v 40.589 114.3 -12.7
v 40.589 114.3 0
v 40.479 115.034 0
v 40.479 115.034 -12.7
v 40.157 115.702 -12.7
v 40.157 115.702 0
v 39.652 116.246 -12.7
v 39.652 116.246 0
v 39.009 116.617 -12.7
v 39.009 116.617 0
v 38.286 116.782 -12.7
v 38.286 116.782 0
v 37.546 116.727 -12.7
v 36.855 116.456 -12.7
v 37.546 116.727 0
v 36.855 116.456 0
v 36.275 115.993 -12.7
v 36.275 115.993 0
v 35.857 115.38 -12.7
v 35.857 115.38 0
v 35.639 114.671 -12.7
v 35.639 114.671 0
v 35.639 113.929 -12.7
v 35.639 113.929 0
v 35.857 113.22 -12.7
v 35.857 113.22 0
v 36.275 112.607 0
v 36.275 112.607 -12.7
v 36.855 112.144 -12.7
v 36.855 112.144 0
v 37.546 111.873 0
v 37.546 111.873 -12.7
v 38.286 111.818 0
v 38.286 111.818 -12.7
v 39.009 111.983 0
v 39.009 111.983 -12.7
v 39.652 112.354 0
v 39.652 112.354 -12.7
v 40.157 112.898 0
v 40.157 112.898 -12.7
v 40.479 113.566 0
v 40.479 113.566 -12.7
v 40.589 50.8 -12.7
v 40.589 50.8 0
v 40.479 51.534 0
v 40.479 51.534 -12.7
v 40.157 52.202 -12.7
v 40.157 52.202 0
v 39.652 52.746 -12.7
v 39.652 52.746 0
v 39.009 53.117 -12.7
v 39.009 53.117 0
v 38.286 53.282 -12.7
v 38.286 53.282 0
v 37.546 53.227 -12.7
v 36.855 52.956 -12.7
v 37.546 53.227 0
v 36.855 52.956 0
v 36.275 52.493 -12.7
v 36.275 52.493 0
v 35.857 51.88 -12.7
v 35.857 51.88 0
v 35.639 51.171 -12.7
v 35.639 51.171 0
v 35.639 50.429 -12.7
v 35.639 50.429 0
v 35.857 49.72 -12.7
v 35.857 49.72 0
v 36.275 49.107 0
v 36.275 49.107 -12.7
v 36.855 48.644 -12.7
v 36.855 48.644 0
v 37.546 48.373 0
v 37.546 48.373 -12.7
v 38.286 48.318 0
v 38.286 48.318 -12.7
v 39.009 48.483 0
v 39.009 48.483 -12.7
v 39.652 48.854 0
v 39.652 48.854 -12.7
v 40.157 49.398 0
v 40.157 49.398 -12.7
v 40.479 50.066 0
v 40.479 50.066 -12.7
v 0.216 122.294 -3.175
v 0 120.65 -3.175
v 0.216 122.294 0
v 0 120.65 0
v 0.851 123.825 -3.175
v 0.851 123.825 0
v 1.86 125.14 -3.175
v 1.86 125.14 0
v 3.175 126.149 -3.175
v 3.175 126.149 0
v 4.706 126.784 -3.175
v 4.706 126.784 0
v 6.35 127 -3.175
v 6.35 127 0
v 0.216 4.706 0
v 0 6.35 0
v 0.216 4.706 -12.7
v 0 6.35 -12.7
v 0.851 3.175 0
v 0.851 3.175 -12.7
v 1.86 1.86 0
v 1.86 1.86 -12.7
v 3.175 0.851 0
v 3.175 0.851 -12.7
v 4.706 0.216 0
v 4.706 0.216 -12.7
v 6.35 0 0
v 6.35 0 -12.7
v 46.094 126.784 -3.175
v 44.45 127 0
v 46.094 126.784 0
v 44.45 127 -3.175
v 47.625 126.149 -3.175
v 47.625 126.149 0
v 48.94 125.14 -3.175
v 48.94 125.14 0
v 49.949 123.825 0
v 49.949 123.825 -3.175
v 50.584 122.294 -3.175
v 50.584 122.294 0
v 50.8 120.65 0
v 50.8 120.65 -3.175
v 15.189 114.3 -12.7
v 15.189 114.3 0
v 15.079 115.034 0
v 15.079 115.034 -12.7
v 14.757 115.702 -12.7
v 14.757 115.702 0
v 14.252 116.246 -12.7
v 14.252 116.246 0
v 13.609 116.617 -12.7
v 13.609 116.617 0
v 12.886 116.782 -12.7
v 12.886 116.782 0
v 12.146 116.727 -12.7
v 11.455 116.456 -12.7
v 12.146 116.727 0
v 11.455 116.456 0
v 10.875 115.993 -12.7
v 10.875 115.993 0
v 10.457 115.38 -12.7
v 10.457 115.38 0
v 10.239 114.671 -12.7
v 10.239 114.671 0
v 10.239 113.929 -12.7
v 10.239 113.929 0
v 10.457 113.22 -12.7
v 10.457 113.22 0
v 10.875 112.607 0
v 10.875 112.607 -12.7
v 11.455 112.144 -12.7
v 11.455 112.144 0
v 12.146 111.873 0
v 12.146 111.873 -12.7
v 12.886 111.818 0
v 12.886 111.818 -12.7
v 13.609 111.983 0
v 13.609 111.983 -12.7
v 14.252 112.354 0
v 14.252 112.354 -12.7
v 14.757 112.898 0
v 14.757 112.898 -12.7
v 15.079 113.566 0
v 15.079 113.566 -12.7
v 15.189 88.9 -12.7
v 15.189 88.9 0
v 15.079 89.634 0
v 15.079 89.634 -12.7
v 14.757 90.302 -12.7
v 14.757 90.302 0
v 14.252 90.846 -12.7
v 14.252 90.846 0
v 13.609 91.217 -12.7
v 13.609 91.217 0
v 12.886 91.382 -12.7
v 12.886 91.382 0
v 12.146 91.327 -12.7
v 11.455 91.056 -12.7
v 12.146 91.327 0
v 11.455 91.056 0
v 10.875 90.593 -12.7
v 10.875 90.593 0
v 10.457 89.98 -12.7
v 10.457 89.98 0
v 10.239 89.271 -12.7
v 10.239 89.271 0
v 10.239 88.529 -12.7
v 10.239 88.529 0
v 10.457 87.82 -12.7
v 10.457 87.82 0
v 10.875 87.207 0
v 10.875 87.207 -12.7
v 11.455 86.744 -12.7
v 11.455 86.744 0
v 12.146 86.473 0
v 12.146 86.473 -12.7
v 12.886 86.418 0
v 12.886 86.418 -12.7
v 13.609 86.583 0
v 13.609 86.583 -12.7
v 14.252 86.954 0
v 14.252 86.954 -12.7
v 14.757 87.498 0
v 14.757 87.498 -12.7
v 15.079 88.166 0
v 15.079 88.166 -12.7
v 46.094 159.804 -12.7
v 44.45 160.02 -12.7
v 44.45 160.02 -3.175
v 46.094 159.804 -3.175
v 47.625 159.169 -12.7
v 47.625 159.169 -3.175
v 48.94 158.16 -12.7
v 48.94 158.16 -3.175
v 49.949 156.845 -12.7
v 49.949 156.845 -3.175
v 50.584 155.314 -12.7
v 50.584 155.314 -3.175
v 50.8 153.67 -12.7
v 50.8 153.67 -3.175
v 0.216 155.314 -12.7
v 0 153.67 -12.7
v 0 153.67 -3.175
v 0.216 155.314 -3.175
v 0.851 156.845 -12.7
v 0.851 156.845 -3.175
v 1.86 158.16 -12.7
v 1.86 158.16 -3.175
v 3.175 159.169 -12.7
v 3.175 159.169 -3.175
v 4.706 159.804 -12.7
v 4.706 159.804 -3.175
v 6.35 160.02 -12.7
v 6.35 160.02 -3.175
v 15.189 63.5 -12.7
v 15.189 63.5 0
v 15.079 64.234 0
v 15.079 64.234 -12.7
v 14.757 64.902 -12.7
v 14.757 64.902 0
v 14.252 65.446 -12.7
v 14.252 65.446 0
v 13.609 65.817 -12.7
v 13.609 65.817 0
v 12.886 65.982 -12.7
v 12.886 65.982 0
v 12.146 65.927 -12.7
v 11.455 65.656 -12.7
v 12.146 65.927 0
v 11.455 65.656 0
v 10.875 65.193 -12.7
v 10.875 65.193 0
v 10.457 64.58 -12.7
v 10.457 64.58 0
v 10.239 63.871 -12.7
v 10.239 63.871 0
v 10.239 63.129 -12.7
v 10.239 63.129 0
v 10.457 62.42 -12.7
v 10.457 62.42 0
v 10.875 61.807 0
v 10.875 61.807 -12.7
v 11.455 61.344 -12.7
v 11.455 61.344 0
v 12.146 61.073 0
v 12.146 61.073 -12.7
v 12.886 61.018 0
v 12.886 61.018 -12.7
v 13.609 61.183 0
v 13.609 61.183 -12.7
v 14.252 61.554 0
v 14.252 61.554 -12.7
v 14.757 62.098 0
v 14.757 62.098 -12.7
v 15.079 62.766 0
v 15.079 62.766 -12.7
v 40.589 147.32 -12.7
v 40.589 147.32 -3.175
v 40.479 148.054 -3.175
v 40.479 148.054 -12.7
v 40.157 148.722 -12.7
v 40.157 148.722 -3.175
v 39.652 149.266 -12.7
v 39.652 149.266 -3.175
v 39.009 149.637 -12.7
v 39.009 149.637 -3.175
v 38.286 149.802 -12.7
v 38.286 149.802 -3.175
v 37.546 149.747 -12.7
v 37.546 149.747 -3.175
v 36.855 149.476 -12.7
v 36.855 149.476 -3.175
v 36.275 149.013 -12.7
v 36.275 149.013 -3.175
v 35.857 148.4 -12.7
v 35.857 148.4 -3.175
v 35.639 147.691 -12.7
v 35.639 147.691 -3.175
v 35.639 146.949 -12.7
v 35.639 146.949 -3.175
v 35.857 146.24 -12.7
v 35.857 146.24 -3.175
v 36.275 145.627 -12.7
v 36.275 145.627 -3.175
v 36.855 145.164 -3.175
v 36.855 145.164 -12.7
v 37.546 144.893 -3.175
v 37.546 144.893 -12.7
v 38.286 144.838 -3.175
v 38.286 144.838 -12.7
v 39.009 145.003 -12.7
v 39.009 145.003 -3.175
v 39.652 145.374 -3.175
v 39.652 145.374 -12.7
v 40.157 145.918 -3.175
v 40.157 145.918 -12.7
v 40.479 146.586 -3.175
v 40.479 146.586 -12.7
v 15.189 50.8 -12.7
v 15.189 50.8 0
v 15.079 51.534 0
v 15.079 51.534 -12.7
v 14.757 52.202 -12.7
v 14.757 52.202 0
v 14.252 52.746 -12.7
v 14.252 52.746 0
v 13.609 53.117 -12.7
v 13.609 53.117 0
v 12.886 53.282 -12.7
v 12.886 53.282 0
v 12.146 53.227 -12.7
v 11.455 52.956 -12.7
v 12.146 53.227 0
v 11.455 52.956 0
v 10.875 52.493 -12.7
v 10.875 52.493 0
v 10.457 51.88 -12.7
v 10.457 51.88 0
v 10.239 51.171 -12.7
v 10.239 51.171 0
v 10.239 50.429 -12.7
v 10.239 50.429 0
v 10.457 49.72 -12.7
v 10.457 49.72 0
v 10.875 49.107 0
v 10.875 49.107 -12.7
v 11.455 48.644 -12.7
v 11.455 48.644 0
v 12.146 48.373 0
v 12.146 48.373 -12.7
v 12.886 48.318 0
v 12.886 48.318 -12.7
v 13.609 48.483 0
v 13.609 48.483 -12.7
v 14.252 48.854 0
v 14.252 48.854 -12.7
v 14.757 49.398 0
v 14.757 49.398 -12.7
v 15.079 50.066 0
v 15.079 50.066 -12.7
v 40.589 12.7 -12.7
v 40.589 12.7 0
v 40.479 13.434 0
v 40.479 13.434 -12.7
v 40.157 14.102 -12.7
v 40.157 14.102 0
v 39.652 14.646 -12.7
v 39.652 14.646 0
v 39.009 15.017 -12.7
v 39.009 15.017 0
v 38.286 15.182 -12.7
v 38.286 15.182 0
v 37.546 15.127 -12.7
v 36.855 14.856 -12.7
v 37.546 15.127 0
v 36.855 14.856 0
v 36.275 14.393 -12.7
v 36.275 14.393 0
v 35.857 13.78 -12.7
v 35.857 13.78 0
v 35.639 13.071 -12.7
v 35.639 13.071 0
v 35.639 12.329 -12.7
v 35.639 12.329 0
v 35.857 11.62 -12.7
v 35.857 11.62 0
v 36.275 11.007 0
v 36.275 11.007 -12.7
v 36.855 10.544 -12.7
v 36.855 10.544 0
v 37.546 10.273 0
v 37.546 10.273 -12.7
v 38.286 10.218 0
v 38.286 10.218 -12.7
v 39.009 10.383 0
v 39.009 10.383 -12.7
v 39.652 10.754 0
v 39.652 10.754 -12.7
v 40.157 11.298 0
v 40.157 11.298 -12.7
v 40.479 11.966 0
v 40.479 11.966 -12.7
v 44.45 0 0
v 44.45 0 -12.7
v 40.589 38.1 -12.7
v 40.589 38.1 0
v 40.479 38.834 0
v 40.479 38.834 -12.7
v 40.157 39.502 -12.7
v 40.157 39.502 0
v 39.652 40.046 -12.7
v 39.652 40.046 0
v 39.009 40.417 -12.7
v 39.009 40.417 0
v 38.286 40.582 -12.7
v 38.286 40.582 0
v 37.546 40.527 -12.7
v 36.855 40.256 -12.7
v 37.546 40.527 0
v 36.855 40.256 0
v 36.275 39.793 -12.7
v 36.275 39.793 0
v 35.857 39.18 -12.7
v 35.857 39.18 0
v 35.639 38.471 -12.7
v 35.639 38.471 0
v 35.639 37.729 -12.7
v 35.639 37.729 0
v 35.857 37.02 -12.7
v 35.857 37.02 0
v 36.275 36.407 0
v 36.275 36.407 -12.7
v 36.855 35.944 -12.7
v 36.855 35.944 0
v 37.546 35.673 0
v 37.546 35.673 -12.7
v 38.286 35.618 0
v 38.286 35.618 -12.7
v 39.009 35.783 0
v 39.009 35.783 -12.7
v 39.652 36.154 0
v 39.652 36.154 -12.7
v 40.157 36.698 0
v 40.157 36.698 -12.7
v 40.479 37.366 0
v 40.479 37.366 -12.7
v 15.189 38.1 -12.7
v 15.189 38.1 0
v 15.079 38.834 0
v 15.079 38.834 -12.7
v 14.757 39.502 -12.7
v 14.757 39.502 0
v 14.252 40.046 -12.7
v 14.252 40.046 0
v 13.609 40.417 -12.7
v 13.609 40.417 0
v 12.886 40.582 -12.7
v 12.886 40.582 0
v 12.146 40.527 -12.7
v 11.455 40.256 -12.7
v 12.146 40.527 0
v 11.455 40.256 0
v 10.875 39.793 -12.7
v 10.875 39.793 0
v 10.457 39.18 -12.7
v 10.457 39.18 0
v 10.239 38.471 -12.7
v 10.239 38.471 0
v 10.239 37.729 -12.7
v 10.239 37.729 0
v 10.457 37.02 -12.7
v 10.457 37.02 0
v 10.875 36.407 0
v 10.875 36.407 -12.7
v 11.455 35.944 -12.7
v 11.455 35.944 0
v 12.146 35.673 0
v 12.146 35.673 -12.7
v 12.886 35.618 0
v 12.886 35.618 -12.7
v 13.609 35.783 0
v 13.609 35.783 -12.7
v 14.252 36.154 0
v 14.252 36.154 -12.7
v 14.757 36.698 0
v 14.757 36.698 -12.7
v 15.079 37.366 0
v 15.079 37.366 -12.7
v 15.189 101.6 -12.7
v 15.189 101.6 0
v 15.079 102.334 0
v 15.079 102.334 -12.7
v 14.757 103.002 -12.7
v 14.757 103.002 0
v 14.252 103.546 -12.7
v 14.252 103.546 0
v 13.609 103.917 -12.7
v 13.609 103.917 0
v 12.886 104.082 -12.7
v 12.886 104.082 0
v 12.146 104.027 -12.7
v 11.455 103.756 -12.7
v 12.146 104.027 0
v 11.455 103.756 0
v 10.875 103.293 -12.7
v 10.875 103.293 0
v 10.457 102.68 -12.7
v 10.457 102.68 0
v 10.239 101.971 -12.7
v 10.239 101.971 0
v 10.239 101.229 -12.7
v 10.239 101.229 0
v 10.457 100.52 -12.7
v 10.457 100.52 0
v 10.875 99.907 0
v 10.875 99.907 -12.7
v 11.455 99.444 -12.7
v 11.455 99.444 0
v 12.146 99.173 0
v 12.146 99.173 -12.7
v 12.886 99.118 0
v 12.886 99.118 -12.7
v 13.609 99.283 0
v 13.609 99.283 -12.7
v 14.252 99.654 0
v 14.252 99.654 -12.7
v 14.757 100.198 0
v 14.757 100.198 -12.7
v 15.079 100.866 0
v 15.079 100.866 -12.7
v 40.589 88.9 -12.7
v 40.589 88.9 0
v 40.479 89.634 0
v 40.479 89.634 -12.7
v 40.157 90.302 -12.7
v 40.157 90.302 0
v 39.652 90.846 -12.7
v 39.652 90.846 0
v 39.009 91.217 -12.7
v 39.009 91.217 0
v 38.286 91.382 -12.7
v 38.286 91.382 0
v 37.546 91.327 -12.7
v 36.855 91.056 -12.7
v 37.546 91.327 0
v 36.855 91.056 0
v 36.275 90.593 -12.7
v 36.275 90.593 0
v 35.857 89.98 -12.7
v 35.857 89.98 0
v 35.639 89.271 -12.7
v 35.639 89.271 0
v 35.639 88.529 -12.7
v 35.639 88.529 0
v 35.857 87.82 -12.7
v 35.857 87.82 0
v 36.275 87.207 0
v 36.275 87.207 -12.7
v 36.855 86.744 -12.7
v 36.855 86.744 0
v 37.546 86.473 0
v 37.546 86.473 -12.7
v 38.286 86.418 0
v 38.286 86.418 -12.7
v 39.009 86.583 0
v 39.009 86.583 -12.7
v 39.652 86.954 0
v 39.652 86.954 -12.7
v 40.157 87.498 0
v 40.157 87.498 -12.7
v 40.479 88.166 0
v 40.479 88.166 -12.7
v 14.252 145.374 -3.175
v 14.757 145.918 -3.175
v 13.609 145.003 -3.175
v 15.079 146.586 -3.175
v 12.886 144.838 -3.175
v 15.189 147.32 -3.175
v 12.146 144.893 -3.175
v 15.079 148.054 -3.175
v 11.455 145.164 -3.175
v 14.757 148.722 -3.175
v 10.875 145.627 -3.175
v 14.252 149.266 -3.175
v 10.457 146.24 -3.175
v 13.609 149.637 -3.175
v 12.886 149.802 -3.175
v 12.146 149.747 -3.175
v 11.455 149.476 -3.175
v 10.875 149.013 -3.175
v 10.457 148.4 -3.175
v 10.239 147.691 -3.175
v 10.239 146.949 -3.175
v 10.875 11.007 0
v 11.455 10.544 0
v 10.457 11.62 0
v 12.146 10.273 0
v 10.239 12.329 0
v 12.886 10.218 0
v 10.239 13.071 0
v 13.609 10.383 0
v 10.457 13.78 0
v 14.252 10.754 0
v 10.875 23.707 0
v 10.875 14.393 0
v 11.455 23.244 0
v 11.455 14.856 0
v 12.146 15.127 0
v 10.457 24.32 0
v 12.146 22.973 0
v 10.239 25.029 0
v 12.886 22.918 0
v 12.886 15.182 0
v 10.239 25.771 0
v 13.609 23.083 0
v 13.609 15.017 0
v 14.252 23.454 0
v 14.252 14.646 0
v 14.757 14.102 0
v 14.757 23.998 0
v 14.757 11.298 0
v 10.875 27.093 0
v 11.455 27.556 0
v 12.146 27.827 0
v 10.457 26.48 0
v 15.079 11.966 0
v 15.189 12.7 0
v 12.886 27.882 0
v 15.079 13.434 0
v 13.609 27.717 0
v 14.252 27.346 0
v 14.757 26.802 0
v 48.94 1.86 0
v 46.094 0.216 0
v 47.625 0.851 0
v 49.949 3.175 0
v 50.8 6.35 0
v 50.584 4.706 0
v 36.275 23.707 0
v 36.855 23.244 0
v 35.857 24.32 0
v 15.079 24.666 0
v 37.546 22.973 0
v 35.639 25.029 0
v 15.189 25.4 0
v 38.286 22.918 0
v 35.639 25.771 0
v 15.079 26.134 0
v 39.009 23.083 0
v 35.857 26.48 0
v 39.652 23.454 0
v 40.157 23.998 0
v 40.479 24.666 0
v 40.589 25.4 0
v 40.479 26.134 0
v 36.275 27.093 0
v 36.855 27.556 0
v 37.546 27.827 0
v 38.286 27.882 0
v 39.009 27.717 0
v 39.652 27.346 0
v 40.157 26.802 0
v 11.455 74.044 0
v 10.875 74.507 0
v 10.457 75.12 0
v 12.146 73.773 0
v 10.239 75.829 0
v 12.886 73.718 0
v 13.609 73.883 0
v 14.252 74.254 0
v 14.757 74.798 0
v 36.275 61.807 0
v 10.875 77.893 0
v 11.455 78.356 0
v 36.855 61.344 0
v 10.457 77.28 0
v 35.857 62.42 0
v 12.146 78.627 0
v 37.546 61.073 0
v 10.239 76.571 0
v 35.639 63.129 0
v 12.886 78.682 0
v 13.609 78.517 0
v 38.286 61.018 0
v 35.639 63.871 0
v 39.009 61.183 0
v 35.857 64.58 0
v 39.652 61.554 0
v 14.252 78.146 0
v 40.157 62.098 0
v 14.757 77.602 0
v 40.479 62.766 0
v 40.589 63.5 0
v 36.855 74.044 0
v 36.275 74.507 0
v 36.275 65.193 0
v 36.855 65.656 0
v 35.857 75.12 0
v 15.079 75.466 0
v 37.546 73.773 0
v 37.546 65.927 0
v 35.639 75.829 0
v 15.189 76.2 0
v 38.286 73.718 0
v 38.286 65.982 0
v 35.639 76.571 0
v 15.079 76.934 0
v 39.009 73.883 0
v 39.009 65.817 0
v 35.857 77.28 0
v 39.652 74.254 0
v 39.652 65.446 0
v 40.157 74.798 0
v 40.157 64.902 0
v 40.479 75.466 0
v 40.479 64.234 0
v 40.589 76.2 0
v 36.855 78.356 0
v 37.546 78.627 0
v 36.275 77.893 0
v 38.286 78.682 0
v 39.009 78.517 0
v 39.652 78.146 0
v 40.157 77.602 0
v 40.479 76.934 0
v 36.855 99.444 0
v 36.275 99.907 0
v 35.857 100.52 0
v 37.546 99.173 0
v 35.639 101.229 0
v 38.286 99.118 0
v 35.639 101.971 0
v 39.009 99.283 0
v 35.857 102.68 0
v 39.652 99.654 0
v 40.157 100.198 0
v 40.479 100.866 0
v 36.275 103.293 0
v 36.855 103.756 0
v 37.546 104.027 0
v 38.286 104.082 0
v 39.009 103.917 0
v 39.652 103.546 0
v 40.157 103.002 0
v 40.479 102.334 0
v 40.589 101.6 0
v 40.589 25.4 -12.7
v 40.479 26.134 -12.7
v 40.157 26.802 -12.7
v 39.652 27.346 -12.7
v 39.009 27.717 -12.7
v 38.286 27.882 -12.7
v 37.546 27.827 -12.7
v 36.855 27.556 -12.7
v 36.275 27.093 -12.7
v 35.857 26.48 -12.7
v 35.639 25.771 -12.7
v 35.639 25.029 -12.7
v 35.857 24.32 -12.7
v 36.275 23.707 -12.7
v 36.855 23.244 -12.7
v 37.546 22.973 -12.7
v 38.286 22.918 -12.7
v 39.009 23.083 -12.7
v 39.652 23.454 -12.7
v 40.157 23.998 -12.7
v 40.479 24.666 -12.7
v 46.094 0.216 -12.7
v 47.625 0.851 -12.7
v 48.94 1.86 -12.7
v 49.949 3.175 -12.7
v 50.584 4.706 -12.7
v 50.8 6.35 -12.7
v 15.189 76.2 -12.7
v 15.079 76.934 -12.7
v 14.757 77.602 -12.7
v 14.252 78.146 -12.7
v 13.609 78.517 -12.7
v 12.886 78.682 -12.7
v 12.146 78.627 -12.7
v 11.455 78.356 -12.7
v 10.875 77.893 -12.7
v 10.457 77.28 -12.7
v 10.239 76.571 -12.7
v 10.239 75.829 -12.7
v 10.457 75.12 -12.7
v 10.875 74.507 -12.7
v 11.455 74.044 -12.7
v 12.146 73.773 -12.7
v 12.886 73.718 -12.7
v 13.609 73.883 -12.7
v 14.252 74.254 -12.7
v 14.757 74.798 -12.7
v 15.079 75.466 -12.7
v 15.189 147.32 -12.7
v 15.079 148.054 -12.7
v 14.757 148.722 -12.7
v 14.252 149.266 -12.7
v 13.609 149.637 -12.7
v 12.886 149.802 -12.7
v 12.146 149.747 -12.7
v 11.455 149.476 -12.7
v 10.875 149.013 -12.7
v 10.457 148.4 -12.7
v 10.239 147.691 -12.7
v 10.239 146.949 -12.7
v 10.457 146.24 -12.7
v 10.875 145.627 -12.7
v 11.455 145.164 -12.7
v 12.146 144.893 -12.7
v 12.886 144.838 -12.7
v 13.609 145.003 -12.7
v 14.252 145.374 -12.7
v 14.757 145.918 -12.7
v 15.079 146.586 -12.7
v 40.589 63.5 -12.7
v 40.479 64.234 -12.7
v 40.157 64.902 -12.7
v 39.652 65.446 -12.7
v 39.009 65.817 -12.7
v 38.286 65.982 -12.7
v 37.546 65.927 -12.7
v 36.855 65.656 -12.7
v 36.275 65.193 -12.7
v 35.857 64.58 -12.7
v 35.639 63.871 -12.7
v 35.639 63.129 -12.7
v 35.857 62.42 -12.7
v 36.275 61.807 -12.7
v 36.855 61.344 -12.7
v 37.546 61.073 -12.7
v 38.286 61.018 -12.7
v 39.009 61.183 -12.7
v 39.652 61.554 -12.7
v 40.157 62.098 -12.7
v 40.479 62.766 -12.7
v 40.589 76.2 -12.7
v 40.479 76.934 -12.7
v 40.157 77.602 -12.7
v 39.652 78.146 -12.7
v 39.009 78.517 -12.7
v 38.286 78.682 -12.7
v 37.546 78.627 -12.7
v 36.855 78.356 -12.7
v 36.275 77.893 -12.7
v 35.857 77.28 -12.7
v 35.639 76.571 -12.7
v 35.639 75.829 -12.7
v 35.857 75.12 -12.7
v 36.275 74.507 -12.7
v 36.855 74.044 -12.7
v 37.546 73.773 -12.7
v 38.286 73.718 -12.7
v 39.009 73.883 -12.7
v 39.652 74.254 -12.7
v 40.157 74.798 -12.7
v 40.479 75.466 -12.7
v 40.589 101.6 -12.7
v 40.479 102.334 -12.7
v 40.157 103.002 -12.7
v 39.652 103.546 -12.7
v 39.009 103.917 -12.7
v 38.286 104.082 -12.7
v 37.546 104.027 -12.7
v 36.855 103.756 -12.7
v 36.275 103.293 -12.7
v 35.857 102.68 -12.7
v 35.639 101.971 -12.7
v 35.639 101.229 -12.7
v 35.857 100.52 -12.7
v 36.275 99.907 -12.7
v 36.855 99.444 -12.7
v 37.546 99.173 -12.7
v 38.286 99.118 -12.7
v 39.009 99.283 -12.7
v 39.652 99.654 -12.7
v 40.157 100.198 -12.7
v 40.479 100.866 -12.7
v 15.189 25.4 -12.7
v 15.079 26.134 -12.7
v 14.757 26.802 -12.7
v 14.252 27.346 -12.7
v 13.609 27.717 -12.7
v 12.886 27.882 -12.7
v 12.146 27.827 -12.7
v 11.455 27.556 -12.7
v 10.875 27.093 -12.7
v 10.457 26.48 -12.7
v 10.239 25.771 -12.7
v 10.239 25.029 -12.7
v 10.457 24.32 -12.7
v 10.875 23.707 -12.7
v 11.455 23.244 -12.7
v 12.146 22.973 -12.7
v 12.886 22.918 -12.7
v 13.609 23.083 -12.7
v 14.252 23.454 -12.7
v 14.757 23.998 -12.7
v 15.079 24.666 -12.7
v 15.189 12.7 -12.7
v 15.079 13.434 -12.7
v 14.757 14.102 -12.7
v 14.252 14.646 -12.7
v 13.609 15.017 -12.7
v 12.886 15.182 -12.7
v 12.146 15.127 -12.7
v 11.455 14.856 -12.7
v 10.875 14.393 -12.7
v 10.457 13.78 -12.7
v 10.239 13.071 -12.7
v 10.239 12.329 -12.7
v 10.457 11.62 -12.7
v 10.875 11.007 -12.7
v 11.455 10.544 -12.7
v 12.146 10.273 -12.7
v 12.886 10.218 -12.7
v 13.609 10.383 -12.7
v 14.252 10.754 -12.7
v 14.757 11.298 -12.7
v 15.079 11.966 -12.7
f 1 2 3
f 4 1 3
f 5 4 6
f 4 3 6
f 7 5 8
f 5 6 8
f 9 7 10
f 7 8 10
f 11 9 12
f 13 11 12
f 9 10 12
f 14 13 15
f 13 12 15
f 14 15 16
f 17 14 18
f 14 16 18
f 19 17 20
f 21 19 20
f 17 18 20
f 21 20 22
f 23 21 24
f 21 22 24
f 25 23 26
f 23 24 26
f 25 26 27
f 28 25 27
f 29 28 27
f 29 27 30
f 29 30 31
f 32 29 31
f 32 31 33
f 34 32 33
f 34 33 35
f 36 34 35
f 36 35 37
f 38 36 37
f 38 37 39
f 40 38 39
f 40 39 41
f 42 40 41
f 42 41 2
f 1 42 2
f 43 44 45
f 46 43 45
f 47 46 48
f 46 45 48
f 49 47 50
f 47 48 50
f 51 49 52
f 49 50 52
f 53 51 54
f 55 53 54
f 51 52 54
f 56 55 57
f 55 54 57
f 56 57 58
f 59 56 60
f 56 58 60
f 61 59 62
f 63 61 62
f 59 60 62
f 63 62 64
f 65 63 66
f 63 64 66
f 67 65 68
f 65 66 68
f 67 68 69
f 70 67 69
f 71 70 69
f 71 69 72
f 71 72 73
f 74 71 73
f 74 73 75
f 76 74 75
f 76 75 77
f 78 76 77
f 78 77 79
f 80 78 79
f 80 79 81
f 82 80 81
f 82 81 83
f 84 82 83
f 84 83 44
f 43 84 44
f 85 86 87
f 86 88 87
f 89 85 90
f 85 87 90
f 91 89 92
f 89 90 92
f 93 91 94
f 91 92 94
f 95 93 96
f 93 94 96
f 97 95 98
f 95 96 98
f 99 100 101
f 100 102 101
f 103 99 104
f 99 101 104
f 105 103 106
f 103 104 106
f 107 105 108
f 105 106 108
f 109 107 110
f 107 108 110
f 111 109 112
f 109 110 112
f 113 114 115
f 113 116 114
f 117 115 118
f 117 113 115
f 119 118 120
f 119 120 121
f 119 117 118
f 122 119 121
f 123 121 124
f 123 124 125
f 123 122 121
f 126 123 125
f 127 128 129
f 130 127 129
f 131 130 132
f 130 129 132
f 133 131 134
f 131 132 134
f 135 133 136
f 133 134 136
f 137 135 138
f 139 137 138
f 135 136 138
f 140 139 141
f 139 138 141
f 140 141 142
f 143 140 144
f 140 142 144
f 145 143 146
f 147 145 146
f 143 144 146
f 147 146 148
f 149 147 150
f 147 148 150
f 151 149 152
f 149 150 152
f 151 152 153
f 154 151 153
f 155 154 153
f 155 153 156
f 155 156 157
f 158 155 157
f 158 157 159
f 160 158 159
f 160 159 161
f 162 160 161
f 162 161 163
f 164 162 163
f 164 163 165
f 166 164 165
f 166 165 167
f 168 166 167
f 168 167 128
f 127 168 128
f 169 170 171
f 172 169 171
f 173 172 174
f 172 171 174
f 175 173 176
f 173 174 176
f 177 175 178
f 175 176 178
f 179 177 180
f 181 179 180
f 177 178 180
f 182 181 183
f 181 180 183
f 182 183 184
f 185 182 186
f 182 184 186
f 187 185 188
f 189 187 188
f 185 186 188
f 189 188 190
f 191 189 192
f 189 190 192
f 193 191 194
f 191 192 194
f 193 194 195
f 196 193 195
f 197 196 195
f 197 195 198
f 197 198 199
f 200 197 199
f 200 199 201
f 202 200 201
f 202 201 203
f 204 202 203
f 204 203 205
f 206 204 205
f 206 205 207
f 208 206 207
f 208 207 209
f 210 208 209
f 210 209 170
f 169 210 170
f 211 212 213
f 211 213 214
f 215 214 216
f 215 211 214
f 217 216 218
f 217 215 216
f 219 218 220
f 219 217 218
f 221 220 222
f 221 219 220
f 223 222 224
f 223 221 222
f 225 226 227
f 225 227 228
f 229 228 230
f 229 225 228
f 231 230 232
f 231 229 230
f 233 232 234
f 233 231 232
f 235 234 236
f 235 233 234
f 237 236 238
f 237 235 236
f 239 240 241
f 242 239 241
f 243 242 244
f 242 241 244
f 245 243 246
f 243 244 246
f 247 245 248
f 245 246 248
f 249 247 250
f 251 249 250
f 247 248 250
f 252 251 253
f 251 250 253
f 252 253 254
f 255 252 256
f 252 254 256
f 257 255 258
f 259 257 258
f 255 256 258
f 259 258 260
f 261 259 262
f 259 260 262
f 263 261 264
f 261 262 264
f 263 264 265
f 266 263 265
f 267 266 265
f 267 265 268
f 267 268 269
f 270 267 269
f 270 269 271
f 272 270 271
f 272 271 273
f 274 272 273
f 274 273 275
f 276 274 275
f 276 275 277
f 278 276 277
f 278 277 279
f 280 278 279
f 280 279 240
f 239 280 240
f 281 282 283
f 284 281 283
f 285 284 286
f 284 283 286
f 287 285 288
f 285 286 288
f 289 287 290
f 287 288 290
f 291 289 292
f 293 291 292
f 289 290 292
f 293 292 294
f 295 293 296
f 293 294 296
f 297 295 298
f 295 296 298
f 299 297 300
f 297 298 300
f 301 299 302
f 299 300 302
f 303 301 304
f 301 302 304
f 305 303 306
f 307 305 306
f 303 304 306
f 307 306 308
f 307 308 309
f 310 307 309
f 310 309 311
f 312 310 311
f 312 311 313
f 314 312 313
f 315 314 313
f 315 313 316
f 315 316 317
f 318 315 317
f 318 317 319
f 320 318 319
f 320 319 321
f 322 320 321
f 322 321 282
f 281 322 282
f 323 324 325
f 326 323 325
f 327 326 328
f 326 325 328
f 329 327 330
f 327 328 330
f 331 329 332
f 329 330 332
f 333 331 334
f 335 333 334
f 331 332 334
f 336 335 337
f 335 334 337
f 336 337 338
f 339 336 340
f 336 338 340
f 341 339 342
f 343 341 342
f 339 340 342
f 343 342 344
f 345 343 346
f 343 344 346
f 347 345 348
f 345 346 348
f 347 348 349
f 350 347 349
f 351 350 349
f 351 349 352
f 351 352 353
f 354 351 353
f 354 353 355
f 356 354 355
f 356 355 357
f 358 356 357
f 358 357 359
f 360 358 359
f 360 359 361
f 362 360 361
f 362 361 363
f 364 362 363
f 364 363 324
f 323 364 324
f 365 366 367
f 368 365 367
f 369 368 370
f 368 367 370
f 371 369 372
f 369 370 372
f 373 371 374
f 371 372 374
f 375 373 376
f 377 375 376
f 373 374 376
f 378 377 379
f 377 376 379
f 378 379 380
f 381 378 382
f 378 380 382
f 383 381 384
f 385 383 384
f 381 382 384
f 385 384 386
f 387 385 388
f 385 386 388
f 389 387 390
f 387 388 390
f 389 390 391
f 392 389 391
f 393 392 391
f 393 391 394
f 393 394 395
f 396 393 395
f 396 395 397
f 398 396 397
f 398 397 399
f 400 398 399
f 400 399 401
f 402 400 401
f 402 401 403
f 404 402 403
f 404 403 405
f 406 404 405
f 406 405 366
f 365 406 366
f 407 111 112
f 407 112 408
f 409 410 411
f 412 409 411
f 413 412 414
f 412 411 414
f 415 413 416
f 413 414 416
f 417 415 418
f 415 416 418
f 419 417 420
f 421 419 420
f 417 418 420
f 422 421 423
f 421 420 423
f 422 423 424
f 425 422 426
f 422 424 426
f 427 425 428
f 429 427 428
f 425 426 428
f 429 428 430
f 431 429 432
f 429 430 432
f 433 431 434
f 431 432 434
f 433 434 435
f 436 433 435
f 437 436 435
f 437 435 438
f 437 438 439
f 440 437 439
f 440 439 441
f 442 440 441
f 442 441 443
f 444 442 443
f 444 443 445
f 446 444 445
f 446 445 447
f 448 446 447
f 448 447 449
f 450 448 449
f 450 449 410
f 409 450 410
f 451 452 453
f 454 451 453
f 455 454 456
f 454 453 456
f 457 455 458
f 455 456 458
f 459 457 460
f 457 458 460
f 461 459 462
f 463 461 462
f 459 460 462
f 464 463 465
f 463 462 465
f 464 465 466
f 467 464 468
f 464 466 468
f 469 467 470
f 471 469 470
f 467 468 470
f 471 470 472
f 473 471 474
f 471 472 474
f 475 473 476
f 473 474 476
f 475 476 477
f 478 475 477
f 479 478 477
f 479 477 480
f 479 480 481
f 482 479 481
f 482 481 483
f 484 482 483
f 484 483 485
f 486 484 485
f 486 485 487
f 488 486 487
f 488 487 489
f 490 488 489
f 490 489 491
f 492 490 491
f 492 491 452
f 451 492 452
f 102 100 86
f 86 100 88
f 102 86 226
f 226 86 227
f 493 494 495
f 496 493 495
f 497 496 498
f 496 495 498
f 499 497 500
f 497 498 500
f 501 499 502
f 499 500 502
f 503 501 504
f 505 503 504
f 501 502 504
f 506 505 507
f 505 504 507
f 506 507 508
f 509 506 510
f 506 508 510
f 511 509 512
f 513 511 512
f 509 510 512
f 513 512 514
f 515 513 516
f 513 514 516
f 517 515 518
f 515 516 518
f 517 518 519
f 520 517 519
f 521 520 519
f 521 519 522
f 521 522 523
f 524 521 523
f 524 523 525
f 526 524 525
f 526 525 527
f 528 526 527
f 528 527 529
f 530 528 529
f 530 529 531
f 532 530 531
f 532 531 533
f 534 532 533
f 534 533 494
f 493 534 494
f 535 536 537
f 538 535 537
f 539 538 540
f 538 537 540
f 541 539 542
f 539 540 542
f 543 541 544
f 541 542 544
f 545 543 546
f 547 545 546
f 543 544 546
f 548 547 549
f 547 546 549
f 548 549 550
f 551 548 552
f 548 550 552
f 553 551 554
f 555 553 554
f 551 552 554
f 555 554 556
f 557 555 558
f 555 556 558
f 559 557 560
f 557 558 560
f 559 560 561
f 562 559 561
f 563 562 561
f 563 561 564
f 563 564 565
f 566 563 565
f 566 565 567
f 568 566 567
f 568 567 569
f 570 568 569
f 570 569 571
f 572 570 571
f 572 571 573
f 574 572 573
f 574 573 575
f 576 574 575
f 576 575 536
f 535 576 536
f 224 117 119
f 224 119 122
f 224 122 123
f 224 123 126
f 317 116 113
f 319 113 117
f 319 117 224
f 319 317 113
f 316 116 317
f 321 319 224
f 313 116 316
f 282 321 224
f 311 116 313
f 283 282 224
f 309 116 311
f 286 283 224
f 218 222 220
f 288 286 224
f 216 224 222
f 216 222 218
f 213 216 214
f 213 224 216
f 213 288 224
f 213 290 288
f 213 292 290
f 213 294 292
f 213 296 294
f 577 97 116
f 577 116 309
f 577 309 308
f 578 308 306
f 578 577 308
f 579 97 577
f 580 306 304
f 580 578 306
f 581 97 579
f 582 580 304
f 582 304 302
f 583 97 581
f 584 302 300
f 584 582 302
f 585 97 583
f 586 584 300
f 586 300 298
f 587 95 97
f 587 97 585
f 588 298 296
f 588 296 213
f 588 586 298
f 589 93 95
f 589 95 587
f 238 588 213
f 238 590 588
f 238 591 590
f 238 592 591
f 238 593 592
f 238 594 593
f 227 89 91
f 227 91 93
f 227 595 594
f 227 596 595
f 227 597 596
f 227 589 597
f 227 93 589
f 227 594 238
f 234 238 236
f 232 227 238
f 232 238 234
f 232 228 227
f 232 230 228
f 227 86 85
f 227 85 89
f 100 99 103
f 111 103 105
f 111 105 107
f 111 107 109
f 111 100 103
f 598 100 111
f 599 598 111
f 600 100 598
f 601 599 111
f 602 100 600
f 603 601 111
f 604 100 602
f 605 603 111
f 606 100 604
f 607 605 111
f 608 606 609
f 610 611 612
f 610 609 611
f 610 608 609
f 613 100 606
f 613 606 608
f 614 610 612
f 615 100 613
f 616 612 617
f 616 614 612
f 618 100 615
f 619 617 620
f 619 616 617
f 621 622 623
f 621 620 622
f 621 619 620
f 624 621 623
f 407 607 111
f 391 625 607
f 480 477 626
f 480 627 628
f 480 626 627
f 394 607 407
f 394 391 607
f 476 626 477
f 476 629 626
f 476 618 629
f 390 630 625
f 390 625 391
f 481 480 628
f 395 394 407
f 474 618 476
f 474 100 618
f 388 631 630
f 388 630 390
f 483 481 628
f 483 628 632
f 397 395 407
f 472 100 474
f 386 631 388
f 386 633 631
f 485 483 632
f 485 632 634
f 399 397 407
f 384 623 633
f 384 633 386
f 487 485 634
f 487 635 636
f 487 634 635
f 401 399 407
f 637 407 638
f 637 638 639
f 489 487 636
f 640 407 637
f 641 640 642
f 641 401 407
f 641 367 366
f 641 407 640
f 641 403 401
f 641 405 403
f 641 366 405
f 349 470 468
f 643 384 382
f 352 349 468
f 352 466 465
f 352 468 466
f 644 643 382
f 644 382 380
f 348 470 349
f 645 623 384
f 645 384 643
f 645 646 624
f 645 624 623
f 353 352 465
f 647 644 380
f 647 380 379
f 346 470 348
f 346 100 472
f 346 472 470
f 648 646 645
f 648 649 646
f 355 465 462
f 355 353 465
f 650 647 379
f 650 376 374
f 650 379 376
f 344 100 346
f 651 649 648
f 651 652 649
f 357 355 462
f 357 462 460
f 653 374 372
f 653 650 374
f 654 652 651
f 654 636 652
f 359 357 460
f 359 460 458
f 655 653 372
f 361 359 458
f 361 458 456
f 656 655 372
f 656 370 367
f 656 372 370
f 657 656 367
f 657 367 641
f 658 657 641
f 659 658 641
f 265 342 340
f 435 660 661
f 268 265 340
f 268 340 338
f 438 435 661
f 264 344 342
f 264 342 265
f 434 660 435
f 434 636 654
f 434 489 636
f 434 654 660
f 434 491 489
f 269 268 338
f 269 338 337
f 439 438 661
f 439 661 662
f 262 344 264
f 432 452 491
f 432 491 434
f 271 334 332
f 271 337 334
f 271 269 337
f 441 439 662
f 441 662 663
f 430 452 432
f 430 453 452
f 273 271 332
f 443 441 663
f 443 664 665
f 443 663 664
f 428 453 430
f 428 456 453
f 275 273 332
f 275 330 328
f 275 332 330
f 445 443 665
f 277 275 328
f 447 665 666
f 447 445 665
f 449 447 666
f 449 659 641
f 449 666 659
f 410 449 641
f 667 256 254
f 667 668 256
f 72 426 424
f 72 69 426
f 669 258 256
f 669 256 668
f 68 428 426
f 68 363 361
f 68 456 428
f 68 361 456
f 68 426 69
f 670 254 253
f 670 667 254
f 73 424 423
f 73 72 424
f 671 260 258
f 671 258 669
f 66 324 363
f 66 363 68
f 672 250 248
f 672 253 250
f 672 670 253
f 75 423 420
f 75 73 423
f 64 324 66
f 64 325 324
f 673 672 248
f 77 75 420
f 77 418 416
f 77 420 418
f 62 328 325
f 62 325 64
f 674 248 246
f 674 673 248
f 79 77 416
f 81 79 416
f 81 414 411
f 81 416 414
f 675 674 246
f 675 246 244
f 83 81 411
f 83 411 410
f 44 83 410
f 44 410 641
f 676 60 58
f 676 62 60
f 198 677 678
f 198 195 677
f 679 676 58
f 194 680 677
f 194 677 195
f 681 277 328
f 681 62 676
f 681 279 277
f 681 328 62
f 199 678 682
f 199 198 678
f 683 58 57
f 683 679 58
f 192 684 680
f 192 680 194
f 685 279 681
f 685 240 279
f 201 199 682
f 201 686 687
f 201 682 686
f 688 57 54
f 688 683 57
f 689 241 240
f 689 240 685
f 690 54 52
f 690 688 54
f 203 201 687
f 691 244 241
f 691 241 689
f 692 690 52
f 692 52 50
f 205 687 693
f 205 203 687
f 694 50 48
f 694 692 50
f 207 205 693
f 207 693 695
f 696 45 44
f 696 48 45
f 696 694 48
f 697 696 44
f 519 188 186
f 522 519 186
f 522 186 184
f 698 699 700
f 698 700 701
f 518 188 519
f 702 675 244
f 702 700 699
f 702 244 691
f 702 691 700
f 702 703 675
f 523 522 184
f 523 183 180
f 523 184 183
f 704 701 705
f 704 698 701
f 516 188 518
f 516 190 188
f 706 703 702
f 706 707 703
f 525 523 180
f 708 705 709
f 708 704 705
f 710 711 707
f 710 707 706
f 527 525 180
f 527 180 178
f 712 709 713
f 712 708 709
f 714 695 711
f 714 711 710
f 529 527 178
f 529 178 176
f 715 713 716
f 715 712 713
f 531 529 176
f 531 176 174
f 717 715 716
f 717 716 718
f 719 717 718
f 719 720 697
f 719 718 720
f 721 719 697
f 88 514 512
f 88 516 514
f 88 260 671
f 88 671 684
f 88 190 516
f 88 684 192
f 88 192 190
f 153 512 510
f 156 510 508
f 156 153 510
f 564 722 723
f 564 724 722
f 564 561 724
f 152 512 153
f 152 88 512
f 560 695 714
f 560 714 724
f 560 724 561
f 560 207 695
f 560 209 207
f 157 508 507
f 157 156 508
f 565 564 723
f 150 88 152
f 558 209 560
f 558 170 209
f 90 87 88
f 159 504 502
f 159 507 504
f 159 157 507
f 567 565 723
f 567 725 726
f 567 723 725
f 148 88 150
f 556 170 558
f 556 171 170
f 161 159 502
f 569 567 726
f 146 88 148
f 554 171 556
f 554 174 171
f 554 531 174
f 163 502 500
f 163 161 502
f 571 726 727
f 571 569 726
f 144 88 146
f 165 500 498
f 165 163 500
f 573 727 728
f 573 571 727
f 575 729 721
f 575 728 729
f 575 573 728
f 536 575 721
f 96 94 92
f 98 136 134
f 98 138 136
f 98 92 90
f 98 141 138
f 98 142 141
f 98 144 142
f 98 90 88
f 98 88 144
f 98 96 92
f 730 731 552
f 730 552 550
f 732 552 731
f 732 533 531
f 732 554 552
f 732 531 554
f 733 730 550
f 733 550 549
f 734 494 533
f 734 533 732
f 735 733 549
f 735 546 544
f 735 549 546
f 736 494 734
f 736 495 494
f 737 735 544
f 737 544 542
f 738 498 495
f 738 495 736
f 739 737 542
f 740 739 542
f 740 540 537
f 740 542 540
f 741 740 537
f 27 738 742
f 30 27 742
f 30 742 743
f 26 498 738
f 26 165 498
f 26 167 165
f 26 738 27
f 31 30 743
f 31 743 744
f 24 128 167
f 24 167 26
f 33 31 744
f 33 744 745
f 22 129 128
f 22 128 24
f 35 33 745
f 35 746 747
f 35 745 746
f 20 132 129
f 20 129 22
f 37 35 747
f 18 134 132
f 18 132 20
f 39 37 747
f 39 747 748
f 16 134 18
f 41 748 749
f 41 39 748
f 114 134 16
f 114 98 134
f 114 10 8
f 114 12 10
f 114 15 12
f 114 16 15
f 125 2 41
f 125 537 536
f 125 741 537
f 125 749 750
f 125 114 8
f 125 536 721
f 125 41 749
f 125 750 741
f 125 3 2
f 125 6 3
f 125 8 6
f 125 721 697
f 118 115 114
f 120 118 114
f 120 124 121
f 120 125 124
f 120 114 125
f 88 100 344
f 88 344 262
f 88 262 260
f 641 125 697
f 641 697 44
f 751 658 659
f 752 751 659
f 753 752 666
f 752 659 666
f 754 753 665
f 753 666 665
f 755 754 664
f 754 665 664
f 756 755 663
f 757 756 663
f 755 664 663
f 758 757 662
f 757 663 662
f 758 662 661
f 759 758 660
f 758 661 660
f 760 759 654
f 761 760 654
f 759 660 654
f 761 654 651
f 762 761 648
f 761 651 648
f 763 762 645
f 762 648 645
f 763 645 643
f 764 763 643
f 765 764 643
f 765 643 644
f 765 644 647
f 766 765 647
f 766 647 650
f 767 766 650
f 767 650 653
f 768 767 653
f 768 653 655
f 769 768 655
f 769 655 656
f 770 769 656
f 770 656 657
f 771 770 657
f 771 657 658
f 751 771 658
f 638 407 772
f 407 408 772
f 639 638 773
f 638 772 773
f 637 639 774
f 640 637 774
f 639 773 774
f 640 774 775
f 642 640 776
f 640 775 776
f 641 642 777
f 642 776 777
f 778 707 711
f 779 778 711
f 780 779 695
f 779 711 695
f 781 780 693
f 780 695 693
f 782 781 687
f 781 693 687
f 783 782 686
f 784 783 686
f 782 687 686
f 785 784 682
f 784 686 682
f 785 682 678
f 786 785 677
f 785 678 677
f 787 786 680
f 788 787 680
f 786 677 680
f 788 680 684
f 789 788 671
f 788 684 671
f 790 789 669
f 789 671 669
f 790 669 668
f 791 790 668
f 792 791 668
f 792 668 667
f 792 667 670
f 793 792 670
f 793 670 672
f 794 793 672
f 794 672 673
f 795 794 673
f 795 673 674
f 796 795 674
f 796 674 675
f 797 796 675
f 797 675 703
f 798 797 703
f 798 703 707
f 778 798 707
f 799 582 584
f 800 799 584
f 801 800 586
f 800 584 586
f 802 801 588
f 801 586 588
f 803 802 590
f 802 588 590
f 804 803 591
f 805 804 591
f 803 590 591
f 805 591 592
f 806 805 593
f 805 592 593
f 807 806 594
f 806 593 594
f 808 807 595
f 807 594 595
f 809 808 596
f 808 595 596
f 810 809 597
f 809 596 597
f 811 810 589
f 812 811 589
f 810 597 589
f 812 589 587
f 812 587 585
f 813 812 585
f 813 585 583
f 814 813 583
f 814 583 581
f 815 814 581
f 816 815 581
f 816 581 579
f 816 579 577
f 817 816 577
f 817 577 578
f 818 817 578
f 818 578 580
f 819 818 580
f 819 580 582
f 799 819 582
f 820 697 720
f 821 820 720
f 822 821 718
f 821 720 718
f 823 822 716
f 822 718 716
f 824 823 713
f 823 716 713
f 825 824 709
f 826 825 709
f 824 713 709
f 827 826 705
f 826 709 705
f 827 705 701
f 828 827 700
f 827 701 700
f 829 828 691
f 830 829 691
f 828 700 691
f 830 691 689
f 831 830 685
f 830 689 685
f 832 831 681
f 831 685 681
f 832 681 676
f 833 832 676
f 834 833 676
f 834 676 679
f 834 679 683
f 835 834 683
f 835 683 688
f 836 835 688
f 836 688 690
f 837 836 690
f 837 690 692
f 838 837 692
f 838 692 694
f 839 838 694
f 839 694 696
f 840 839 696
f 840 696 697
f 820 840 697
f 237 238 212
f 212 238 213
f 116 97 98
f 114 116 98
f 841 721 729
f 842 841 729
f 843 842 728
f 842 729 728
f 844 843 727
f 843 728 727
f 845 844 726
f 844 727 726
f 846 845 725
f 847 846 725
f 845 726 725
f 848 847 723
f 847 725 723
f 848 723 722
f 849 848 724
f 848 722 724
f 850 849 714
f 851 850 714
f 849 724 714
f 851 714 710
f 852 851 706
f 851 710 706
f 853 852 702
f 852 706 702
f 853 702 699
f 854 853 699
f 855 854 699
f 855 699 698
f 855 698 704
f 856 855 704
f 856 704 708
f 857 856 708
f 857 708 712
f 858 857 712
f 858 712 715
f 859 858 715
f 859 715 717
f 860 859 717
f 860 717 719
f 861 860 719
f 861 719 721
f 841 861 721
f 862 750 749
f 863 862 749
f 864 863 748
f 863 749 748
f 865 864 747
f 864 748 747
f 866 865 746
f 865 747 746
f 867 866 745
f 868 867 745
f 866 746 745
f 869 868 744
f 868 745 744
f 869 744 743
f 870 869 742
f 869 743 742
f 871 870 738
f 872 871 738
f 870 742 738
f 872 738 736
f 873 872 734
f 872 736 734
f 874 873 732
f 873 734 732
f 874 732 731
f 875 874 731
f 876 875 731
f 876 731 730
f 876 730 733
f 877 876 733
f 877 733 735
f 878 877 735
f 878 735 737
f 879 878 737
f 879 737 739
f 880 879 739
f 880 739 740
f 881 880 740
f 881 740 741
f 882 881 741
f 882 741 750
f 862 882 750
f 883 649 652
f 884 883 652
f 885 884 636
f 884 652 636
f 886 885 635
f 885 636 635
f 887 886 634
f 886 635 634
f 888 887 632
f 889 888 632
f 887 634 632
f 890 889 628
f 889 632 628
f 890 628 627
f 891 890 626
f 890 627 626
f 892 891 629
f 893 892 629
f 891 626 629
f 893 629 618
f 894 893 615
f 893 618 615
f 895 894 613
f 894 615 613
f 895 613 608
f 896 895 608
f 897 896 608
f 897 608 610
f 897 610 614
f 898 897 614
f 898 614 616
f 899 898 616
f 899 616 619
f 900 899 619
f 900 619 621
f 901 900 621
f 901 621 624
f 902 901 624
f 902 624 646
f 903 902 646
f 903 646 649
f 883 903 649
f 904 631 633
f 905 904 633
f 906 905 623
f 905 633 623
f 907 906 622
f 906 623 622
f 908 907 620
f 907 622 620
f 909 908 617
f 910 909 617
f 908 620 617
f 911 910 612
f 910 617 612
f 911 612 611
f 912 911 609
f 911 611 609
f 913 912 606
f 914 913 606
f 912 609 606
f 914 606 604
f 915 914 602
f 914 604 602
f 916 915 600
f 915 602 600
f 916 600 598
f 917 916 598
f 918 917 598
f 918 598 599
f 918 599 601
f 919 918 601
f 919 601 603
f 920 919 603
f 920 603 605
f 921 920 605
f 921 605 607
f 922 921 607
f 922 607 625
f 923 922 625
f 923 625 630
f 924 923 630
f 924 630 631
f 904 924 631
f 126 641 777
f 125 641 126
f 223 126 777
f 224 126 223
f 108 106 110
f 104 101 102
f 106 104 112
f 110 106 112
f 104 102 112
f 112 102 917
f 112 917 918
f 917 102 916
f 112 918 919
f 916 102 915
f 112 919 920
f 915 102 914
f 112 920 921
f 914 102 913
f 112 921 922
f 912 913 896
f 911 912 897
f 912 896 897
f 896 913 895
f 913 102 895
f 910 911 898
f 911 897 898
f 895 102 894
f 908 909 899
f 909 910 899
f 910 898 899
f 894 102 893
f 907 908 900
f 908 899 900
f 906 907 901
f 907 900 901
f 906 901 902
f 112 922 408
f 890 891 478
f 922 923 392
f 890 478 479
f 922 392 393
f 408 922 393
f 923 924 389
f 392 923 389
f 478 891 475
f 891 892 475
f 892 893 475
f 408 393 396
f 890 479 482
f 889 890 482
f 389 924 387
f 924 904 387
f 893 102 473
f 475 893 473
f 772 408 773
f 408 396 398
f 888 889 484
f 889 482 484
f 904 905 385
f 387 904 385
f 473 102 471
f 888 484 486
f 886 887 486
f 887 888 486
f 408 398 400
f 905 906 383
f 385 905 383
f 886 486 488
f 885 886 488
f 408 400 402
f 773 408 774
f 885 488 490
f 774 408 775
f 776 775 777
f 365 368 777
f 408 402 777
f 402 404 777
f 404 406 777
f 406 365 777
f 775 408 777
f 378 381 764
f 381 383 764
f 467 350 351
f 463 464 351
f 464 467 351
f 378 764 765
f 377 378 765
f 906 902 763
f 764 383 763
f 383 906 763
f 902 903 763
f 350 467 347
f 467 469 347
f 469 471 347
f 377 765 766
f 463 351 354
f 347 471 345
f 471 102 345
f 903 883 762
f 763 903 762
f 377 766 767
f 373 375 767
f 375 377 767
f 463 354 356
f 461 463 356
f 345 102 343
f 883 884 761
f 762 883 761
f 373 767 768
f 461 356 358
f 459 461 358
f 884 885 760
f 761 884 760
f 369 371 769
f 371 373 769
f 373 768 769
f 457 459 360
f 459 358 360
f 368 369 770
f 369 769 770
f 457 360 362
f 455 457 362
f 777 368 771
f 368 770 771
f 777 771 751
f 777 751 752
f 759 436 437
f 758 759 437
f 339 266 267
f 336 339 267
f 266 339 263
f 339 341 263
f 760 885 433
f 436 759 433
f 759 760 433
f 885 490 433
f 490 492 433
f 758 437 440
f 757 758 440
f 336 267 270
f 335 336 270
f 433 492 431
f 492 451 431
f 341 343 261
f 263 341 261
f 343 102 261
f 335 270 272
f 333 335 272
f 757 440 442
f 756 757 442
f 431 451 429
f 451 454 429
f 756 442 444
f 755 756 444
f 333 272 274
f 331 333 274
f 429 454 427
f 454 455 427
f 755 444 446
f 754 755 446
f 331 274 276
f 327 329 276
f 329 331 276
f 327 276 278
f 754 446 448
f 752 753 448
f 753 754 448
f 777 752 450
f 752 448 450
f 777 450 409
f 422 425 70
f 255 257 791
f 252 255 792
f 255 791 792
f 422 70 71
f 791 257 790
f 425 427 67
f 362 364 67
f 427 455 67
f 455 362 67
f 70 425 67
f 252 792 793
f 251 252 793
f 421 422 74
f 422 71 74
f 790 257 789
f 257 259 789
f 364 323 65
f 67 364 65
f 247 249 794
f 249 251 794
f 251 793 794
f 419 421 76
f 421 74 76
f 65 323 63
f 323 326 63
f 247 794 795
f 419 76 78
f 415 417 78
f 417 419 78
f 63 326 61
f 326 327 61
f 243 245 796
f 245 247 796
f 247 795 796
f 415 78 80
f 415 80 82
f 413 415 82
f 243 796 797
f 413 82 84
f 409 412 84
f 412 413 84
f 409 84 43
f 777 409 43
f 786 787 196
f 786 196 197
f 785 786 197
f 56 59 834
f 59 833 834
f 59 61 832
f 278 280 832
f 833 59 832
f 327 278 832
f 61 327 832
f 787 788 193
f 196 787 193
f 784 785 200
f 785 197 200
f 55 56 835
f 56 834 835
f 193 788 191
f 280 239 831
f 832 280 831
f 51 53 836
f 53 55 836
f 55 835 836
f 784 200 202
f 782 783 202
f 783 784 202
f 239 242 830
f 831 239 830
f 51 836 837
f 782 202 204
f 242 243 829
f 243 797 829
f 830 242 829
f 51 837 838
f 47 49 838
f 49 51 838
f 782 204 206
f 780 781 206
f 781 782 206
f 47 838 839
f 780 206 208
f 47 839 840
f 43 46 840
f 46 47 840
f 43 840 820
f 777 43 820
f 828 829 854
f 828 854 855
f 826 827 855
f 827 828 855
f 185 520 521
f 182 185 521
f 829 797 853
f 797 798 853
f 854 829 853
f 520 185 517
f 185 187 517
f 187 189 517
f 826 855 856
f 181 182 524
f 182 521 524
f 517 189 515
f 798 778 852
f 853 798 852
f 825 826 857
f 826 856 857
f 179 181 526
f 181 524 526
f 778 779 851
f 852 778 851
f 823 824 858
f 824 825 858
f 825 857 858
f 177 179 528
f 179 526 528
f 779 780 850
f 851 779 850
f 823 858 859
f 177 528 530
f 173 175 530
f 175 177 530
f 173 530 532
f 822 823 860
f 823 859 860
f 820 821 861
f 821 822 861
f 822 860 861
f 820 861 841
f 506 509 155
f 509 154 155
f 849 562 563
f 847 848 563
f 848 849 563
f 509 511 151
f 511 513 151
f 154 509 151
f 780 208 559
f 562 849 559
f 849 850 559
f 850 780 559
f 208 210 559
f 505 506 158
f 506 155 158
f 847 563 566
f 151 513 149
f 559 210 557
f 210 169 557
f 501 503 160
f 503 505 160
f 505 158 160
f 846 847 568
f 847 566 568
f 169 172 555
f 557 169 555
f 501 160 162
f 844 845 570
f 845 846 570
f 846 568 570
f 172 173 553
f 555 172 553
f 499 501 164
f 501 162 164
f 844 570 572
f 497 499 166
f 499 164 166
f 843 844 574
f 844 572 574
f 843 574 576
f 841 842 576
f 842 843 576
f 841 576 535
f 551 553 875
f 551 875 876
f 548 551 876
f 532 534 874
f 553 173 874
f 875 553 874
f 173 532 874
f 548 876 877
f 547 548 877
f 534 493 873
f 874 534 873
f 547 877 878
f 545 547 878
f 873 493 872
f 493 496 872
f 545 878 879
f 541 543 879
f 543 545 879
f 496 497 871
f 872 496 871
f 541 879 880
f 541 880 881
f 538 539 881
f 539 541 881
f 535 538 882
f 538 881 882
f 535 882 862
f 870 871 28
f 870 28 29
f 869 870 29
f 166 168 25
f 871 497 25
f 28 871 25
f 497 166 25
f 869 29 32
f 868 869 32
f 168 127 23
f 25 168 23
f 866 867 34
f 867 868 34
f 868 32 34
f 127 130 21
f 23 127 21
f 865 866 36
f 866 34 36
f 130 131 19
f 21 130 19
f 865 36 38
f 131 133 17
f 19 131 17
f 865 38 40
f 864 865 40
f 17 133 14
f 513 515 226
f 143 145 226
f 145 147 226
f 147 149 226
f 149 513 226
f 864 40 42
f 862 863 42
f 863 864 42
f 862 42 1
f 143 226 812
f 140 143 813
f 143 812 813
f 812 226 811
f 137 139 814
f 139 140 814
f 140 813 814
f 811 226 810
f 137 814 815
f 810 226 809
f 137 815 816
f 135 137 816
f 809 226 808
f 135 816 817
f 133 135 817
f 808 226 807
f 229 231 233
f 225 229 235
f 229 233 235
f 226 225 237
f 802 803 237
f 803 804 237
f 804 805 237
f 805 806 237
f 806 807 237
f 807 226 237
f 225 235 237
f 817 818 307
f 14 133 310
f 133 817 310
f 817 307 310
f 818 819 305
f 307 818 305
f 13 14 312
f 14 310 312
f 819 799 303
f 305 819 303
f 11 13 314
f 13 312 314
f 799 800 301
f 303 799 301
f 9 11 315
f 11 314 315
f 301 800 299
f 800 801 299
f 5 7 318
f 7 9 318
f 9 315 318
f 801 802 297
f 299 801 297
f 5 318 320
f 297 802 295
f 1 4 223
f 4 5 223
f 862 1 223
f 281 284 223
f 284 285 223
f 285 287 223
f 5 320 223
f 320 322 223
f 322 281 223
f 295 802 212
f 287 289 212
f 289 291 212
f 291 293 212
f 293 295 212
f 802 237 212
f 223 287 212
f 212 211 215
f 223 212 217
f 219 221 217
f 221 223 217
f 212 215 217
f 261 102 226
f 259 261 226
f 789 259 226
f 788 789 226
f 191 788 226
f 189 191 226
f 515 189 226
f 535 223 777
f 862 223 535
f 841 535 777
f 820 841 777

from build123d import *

# Parameters (mm, degrees)
SKETCH2_W           = 50.8
SKETCH2_H           = 160.02
BOSS_EXTRUDE1_DEPTH = 12.7
SKETCH3_R           = 2.4892
CUT_EXTRUDE1_DEPTH  = 169.369624339
FILLET1_R           = 6.35
SKETCH4_W           = 3.175
SKETCH4_H           = 33.02
CUT_EXTRUDE2_DEPTH  = 169.369624339
FILLET3_R           = 6.35


with BuildPart() as part:
    # Sketch2 → Boss-Extrude1 (new body)
    with BuildSketch(Plane.XY):
        with Locations((25.4, 80.01)):
            Rectangle(SKETCH2_W, SKETCH2_H)
    extrude(amount=-BOSS_EXTRUDE1_DEPTH)

    # Sketch3 → Cut-Extrude1 (cut, through all)
    with BuildSketch(Plane.XY):
        with Locations((12.7, 147.32)):
            Circle(SKETCH3_R)
        with Locations((38.1, 147.32)):
            Circle(SKETCH3_R)
        with Locations((12.7, 114.3)):
            Circle(SKETCH3_R)
        with Locations((12.7, 101.6)):
            Circle(SKETCH3_R)
        with Locations((12.7, 88.9)):
            Circle(SKETCH3_R)
        with Locations((12.7, 76.2)):
            Circle(SKETCH3_R)
        with Locations((12.7, 63.5)):
            Circle(SKETCH3_R)
        with Locations((38.1, 101.6)):
            Circle(SKETCH3_R)
        with Locations((38.1, 88.9)):
            Circle(SKETCH3_R)
        with Locations((38.1, 76.2)):
            Circle(SKETCH3_R)
        with Locations((38.1, 63.5)):
            Circle(SKETCH3_R)
        with Locations((38.1, 114.3)):
            Circle(SKETCH3_R)
        with Locations((12.7, 50.8)):
            Circle(SKETCH3_R)
        with Locations((12.7, 38.1)):
            Circle(SKETCH3_R)
        with Locations((12.7, 25.4)):
            Circle(SKETCH3_R)
        with Locations((12.7, 12.7)):
            Circle(SKETCH3_R)
        with Locations((38.1, 50.8)):
            Circle(SKETCH3_R)
        with Locations((38.1, 38.1)):
            Circle(SKETCH3_R)
        with Locations((38.1, 25.4)):
            Circle(SKETCH3_R)
        with Locations((38.1, 12.7)):
            Circle(SKETCH3_R)
    extrude(amount=-CUT_EXTRUDE1_DEPTH, mode=Mode.SUBTRACT)

    # Fillet1
    fillet1_edges = [part.edges().sort_by_distance(p)[0] for p in [
        (0, 160.02, -6.35),
        (50.8, 160.02, -6.35),
        (50.8, 0, -6.35),
        (0, 0, -6.35),
    ]]
    fillet(fillet1_edges, radius=FILLET1_R)

    # Sketch4 → Cut-Extrude2 (cut, through all)
    with BuildSketch(Plane.ZY):
        with Locations((-1.5875, 143.51)):
            Rectangle(SKETCH4_W, SKETCH4_H)
    extrude(amount=-CUT_EXTRUDE2_DEPTH, mode=Mode.SUBTRACT)

    # Fillet3
    fillet3_edges = [part.edges().sort_by_distance(p)[0] for p in [
        (0, 127, -1.5875),
        (50.8, 127, -1.5875),
    ]]
    fillet(fillet3_edges, radius=FILLET3_R)


solid = part.part
